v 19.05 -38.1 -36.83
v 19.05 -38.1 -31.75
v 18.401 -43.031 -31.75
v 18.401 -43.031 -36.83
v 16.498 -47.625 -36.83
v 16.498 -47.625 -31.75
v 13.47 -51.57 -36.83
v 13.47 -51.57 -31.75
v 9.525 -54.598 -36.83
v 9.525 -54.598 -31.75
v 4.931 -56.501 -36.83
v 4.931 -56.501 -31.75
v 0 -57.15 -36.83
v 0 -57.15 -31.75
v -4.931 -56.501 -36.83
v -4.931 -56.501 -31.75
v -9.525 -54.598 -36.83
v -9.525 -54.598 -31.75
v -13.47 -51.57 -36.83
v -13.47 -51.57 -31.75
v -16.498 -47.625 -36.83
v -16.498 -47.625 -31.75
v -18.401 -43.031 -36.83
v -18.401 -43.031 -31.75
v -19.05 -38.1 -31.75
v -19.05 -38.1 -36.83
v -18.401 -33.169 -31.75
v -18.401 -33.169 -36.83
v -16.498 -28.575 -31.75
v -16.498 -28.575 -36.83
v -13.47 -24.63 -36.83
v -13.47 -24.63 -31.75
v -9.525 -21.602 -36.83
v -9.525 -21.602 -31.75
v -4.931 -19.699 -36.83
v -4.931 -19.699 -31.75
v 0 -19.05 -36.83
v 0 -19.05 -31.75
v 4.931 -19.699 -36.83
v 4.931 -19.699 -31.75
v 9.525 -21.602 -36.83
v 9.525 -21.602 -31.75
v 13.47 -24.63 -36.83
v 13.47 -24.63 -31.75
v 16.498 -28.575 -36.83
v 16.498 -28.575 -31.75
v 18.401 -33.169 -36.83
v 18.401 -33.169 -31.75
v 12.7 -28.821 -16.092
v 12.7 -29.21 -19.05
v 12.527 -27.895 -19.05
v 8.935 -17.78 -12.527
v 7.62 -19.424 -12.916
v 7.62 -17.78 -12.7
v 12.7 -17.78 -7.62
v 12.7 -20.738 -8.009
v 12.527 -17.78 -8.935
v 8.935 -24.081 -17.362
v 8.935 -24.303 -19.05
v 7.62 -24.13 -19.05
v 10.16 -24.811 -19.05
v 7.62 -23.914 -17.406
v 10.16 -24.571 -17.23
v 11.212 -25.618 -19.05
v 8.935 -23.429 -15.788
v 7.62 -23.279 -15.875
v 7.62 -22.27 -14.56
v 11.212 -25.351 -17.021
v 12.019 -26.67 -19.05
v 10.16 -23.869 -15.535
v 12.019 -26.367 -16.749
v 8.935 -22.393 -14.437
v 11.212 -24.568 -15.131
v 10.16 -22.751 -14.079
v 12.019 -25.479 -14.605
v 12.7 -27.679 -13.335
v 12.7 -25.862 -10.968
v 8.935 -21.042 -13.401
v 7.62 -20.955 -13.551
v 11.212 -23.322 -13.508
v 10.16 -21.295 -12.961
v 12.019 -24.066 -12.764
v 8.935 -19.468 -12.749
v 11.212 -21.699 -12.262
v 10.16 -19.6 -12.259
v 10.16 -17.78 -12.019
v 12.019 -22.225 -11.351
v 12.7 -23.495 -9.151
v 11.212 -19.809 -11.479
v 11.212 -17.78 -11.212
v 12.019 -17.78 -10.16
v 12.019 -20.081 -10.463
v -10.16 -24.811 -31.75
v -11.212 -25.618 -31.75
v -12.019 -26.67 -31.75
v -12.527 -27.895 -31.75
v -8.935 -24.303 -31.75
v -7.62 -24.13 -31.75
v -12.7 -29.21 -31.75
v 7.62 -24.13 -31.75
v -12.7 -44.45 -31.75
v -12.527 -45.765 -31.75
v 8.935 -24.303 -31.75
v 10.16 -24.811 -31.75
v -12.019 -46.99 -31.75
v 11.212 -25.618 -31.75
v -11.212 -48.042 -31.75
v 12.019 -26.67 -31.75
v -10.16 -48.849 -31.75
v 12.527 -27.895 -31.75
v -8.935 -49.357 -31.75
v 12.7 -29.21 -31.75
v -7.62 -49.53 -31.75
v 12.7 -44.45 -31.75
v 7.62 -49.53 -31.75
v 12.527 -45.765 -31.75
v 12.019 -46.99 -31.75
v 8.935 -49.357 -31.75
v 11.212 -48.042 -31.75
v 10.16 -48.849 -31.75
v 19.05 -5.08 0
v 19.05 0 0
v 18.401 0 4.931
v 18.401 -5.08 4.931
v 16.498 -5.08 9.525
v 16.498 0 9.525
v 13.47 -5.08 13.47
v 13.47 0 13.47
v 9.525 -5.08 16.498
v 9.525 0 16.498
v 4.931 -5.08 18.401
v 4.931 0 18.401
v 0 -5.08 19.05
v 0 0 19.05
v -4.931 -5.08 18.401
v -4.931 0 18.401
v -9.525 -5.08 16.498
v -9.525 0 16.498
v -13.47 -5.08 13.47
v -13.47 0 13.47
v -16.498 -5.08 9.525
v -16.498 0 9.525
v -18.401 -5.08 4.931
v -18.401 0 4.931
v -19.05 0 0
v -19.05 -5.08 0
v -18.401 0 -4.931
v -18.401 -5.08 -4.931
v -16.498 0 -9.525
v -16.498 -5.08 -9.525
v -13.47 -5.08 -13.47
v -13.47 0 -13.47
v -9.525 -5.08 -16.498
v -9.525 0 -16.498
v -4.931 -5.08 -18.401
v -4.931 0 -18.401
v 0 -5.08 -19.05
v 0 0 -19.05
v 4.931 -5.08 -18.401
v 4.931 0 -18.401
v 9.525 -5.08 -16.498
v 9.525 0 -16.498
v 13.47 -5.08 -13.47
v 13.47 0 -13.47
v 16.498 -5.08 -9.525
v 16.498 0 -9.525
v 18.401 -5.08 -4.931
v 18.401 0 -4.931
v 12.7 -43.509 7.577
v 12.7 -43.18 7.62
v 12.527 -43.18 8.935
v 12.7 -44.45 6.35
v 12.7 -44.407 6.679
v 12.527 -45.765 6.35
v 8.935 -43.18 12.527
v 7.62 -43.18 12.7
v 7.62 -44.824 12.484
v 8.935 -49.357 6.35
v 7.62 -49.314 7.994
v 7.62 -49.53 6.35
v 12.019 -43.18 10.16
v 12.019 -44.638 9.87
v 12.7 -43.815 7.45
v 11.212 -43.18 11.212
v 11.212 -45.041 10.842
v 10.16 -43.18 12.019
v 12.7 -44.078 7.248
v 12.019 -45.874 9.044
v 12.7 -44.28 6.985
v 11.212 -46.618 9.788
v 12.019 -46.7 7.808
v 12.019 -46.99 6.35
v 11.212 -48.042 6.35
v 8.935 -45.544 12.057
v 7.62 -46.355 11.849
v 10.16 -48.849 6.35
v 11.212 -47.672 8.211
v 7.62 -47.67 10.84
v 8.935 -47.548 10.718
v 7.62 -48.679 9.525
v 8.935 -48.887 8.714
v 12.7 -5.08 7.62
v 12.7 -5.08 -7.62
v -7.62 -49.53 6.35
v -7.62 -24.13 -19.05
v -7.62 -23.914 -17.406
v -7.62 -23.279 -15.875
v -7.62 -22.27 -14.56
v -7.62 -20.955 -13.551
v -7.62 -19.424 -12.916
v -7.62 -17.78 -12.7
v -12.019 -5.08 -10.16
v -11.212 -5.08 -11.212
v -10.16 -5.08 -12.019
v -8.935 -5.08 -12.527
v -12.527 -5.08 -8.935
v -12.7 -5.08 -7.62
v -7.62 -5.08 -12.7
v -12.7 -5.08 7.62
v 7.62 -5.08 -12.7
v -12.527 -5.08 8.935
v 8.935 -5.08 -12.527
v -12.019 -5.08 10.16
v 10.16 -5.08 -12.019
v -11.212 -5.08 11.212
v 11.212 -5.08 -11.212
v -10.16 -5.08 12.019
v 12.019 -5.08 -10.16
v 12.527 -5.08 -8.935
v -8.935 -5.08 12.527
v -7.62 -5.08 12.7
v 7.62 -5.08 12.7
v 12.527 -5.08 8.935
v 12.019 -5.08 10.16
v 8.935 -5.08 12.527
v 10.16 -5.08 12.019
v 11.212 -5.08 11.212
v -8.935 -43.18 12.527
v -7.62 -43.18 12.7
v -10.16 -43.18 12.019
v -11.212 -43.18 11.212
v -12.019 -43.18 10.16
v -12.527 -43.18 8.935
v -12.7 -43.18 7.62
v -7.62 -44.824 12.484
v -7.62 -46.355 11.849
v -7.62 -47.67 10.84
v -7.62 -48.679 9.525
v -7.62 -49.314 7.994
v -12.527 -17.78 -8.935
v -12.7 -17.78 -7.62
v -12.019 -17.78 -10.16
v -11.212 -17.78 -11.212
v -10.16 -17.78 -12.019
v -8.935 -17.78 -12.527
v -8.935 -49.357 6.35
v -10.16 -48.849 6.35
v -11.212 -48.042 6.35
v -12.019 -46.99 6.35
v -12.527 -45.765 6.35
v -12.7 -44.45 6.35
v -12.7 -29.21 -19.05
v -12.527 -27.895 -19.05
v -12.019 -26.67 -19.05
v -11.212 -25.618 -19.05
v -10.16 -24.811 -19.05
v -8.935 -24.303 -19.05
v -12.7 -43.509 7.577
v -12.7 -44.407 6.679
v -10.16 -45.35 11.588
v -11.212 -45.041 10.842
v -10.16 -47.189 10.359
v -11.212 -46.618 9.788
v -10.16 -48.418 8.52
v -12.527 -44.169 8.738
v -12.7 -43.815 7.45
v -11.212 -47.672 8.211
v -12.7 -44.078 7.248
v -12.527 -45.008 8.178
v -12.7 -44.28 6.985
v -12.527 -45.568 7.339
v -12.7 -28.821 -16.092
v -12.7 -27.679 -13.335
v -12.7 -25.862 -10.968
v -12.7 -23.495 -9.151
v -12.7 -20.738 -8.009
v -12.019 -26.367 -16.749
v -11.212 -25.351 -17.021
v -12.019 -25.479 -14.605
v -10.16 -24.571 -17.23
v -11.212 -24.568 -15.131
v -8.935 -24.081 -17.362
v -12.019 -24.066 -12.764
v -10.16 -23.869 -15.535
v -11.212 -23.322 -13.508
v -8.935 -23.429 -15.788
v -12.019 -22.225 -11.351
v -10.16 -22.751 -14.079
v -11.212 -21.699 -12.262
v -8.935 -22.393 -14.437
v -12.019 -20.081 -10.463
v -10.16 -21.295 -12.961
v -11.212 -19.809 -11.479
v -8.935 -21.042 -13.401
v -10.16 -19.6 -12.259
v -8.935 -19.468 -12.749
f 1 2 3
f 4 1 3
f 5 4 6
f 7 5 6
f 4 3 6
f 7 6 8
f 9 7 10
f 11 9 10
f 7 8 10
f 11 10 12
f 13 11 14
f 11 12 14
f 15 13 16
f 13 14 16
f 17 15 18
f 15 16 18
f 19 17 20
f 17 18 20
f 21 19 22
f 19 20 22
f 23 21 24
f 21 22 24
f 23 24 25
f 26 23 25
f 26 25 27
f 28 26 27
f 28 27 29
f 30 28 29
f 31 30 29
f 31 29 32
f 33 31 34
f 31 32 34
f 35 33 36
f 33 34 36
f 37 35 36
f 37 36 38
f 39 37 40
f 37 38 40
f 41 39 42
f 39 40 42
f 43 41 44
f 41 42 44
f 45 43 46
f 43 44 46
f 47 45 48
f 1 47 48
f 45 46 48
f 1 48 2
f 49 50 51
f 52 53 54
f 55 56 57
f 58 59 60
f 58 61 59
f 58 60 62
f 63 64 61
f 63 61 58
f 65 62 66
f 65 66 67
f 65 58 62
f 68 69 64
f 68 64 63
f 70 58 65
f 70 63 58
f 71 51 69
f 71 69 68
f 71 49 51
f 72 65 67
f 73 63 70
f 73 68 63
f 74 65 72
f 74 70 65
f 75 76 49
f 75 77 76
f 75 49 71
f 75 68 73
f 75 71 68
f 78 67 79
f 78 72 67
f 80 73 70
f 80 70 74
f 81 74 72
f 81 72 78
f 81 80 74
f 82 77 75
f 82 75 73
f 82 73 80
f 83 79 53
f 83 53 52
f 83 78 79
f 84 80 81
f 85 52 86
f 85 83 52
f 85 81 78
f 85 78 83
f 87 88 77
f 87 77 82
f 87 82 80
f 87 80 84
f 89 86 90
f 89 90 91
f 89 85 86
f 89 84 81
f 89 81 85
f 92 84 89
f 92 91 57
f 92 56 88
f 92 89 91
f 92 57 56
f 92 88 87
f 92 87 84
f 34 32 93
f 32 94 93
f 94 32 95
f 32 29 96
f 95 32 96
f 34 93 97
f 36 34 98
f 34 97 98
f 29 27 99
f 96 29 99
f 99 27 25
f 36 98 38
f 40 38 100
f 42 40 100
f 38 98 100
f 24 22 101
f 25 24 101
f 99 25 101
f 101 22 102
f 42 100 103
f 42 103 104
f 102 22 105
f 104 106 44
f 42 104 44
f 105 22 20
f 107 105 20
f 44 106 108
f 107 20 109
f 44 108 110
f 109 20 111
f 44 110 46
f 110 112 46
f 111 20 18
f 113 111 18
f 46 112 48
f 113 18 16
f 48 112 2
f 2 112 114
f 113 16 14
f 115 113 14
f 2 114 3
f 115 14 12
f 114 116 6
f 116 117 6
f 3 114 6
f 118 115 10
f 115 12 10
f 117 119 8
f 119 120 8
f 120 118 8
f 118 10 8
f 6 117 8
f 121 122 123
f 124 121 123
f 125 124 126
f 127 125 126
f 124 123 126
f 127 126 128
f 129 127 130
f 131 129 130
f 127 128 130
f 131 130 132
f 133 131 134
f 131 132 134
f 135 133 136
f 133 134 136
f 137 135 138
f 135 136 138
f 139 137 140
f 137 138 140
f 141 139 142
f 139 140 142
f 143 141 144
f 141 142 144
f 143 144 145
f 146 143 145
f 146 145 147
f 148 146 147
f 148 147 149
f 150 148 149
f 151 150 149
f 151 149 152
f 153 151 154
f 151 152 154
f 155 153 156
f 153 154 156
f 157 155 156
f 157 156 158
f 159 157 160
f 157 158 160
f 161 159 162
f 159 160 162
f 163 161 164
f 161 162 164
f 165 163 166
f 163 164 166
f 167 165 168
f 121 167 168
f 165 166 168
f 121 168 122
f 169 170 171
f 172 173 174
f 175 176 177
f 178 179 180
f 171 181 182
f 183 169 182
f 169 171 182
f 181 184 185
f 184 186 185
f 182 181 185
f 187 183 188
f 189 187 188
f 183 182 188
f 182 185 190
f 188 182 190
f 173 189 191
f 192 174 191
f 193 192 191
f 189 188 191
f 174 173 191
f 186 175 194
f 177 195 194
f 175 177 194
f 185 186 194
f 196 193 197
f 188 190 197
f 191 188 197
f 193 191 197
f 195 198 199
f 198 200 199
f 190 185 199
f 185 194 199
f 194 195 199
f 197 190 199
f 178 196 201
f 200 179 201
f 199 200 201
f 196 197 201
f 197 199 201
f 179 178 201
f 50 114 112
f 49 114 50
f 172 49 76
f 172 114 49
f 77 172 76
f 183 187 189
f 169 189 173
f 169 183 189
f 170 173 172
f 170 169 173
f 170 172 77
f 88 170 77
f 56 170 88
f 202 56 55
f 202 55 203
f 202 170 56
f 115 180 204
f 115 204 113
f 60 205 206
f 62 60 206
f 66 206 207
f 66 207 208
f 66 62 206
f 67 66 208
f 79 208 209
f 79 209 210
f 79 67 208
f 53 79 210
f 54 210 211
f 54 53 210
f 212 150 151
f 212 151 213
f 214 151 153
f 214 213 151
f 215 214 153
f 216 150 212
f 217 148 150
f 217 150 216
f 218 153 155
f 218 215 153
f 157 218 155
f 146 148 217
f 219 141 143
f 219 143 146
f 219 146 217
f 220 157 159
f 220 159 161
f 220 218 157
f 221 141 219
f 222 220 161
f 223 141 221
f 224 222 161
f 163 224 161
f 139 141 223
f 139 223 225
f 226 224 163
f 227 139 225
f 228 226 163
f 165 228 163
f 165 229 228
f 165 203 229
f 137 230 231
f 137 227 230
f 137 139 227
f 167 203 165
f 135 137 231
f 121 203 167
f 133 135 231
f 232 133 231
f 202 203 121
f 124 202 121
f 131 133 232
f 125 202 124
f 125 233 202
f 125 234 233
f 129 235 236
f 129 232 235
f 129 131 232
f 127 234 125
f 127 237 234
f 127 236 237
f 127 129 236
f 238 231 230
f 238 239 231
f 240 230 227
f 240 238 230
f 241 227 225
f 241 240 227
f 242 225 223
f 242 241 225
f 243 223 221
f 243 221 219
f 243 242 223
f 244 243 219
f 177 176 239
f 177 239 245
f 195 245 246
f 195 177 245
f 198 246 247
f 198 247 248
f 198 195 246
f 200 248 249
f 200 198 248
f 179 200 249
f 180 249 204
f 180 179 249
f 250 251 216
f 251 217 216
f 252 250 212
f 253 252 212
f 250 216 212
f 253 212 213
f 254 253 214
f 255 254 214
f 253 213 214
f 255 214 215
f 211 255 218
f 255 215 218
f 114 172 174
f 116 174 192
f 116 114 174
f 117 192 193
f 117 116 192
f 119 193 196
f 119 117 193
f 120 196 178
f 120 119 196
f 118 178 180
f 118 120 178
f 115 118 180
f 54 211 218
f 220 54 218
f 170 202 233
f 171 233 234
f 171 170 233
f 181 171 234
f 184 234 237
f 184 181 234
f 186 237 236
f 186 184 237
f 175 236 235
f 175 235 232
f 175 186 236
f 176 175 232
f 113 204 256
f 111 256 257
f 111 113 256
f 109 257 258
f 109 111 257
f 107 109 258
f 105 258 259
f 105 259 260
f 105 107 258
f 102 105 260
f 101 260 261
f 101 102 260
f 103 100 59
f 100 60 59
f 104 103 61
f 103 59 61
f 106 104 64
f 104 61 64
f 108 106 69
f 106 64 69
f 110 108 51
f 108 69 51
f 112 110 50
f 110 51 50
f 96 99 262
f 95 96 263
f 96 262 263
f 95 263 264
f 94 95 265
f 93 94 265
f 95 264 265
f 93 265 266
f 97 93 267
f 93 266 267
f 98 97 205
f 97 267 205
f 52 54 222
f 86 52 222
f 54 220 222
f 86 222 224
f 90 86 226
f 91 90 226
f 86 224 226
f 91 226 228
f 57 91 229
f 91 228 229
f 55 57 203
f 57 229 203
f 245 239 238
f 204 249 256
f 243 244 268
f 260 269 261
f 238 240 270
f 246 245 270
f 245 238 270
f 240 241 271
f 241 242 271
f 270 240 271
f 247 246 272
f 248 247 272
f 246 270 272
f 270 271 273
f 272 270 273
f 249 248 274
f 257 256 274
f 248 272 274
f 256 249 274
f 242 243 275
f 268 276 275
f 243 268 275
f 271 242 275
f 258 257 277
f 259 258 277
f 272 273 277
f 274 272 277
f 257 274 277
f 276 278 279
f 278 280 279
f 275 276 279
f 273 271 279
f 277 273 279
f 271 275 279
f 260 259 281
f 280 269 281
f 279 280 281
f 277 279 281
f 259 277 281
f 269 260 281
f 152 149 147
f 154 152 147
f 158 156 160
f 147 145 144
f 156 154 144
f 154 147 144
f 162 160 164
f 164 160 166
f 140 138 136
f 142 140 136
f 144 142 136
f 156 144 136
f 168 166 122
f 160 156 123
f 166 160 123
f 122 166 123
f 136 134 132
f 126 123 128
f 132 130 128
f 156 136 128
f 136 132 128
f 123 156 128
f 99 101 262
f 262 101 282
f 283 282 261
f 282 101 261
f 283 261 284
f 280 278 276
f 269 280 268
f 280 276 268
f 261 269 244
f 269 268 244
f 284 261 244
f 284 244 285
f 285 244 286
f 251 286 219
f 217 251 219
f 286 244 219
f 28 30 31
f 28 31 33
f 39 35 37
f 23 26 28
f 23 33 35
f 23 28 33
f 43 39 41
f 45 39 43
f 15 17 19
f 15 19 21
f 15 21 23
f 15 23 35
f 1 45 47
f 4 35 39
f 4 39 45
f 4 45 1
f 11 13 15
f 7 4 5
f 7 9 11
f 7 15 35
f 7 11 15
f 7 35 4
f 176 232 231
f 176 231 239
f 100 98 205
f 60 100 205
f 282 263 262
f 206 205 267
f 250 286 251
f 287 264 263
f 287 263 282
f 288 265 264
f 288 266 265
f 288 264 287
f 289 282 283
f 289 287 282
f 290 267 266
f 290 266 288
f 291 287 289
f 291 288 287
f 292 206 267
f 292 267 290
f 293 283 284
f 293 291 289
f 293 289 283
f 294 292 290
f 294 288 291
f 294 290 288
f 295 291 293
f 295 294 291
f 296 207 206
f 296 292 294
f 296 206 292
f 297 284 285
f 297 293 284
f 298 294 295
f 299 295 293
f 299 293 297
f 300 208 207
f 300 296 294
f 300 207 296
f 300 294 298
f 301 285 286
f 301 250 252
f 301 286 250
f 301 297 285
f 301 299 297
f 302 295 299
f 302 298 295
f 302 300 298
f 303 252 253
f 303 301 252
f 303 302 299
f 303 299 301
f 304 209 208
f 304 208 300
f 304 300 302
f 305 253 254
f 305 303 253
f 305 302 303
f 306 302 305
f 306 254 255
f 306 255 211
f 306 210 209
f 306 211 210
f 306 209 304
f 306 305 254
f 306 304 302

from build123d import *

# Parameters (mm, degrees)
F0_R     = 19.05
F1_DEPTH = 5.08
F3_DEPTH = 12.7
F4_R     = 5.08
F5_R     = 19.05
F6_DEPTH = 5.08


with BuildPart() as f1:
    # F0 (on Front) → F1 (new body)
    with BuildSketch(Plane.XZ):
        Circle(F0_R)
    extrude(amount=F1_DEPTH)

    # F2 (on Right) → F3 (join, symmetric)
    with BuildSketch(Plane.YZ):
        with BuildLine():
            Line((-5.08, -12.7), (-5.08, 12.7))
            Line((-5.08, 12.7), (-43.18, 12.7))
            ThreePointArc((-43.18, 12.7), (-47.670128, 10.840128), (-49.53, 6.35))
            Line((-49.53, 6.35), (-49.53, -12.7))
            Line((-49.53, -12.7), (-49.53, -31.75))
            Line((-49.53, -31.75), (-24.13, -31.75))
            Line((-24.13, -31.75), (-24.13, -19.05))
            ThreePointArc((-24.13, -19.05), (-22.270128, -14.559872), (-17.78, -12.7))
            Line((-17.78, -12.7), (-5.08, -12.7))
        make_face()
    extrude(amount=F3_DEPTH, both=True)

    # F4
    f4_edges = [f1.edges().sort_by_distance(p)[0] for p in [
        (-12.7, -24.13, 12.7),
        (12.7, -24.13, 12.7),
        (12.7, -11.43, -12.7),
        (-12.7, -24.13, -25.4),
    ]]
    fillet(f4_edges, radius=F4_R)

    # F5 (on face) → F6 (join)
    with BuildSketch(Plane(origin=(0, 0, -31.75), x_dir=(1, 0, 0), z_dir=(0, 0, -1))):
        with Locations((0, 38.1)):
            Circle(F5_R)
    extrude(amount=F6_DEPTH)


solid = f1.part
